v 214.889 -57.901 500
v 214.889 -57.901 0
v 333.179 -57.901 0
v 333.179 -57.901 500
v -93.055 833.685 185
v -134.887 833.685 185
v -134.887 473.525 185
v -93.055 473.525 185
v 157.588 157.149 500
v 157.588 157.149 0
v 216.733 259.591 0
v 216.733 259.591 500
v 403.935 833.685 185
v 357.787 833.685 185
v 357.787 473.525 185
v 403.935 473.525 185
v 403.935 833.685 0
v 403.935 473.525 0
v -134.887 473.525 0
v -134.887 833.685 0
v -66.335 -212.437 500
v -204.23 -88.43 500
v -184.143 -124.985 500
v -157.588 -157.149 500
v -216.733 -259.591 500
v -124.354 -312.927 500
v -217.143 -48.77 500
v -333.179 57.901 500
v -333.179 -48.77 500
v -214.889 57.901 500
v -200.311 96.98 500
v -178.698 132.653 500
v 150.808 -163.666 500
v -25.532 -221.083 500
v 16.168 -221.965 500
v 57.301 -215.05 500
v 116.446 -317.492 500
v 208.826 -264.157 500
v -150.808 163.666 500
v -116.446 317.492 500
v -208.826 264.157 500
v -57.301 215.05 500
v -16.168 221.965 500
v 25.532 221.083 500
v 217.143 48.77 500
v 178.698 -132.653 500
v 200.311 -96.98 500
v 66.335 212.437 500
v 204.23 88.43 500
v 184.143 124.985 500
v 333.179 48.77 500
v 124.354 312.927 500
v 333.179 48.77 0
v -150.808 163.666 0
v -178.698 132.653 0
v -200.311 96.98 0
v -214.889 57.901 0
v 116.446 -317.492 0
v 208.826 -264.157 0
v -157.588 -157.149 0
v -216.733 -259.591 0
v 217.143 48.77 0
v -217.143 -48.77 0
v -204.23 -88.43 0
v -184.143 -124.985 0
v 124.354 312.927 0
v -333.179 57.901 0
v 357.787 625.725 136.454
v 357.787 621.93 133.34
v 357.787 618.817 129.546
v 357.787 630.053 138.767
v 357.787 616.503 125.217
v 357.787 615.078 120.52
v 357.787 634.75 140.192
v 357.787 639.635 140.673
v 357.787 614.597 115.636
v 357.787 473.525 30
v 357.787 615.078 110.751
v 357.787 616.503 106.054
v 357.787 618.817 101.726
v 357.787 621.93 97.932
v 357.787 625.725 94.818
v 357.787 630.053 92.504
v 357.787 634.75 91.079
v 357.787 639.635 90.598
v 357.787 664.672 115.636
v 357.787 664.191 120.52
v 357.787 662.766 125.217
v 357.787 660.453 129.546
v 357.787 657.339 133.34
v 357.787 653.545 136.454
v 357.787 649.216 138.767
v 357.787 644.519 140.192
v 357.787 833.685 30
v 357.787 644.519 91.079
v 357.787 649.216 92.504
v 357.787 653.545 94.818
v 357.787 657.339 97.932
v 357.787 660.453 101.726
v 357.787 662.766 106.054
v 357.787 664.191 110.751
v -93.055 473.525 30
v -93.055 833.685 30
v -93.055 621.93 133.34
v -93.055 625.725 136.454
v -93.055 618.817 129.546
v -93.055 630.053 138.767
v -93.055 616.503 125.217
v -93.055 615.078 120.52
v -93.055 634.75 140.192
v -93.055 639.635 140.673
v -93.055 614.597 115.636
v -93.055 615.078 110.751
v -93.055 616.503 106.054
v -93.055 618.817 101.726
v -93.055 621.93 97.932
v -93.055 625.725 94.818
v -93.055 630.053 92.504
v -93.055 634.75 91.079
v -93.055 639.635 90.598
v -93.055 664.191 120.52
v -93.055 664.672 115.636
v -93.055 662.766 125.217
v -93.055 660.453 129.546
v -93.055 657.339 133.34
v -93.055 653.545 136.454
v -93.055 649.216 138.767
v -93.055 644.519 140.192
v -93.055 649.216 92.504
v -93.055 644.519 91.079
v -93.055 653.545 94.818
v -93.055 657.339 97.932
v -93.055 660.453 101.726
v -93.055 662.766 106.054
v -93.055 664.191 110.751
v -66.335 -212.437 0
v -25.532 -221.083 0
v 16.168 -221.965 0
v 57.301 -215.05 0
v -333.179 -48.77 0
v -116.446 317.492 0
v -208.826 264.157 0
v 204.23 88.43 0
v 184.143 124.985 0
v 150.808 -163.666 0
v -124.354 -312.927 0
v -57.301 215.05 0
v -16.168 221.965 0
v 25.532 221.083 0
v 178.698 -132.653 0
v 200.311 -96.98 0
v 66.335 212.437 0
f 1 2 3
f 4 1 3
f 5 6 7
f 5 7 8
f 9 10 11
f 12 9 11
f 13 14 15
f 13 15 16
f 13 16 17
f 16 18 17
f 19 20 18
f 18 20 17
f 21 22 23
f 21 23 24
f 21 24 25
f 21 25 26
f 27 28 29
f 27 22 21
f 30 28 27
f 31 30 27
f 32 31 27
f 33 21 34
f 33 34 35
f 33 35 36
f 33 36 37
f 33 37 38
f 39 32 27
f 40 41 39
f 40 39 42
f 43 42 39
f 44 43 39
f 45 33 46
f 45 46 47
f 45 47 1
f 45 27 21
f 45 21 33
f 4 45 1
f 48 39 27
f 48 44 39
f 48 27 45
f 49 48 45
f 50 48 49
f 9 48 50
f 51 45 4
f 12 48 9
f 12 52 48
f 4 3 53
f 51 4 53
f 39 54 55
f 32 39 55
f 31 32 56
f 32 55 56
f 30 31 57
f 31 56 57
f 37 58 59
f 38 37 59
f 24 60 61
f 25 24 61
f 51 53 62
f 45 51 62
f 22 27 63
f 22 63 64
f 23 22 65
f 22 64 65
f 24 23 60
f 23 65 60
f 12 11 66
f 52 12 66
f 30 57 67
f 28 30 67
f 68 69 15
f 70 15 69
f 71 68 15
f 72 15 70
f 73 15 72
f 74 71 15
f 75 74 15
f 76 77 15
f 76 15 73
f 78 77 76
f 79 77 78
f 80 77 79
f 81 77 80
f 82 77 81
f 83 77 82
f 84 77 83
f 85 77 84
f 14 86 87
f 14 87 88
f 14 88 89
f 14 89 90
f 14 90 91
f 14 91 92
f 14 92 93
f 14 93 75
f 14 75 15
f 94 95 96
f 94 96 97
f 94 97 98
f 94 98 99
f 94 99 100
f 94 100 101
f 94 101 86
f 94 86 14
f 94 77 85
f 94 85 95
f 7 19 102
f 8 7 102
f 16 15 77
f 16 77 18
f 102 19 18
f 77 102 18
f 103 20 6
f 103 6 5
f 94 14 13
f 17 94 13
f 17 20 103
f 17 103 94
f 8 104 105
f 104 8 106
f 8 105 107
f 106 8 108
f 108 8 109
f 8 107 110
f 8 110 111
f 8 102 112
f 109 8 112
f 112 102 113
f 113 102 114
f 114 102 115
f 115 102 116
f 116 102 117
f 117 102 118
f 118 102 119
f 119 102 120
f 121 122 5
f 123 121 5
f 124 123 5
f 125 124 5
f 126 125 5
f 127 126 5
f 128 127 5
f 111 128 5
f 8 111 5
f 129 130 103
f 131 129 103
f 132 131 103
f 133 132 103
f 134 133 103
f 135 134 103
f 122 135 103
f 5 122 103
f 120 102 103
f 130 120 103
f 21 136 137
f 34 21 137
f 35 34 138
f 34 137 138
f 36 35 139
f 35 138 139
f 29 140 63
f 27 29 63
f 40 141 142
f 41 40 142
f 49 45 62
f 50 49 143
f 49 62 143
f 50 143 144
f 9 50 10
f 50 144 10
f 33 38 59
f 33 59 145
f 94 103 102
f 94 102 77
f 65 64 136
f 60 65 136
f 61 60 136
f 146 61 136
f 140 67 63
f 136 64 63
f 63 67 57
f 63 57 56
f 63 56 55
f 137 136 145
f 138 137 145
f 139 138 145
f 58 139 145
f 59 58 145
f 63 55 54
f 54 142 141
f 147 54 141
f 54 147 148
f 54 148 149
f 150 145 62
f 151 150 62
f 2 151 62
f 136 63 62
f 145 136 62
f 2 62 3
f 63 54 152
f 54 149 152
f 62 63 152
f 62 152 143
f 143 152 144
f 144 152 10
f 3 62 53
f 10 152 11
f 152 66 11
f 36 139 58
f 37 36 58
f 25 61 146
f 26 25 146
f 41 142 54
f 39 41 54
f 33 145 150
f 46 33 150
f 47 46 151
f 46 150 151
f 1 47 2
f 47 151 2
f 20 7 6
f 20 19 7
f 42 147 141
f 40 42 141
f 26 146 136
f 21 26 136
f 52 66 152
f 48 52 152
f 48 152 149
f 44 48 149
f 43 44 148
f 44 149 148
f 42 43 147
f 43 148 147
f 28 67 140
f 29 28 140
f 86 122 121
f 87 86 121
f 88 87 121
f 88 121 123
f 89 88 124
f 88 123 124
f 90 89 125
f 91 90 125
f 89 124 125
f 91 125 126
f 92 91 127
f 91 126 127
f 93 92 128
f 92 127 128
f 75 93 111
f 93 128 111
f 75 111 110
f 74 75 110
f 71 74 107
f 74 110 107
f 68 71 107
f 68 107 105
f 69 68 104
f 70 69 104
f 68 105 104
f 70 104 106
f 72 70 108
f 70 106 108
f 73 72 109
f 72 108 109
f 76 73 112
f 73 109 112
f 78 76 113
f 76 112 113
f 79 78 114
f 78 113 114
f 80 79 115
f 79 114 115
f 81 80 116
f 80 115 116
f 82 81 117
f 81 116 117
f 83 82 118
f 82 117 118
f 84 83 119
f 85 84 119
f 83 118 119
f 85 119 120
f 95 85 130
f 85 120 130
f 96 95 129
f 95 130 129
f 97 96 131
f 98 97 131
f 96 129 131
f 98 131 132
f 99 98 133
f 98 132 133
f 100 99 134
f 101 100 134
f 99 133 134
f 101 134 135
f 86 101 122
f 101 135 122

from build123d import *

# Parameters (mm, degrees)
F1_DEPTH = 500
F2_W     = 538.8212651014
F2_H     = 360.1605892181
F3_DEPTH = 30
F4_W     = 41.8321043253
F4_H     = 360.1605892181
F5_DEPTH = 155
F7_W     = 46.1477041245
F7_H     = 360.1605892181
F8_DEPTH = 155
F6_R     = 25.0375011005
F9_DEPTH = 450.8414566517


with BuildPart() as f1:
    # F0 (on Top) → F1 (new body)
    with BuildSketch(Plane.XY):
        with BuildLine():
            ThreePointArc((214.8888041559, -57.900887914), (220.6284181264, -29.2029465607), (222.5527150425, 0))
            ThreePointArc((222.5527150425, 0), (221.1962112685, 24.5346101098), (217.1432362758, 48.7701334059))
            Line((217.1432362758, 48.7701334059), (182.5777590275, 48.7701334059))
            Line((182.5777590275, 48.7701334059), (182.5777590275, -57.900887914))
            Line((182.5777590275, -57.900887914), (214.8888041559, -57.900887914))
        make_face()
        with BuildLine():
            ThreePointArc((217.1432362758, 48.7701334059), (221.1962112685, 24.5346101098), (222.5527150425, 0))
            ThreePointArc((222.5527150425, 0), (220.6284181264, -29.2029465607), (214.8888041559, -57.900887914))
            Line((214.8888041559, -57.900887914), (333.17938447, -57.900887914))
            Line((333.17938447, -57.900887914), (333.17938447, 48.7701334059))
            Line((333.17938447, 48.7701334059), (217.1432362758, 48.7701334059))
        make_face()
        with BuildLine():
            Line((182.5777590275, 48.7701334059), (217.1432362758, 48.7701334059))
            ThreePointArc((217.1432362758, 48.7701334059), (195.0445133565, 107.1790501091), (157.5880419131, 157.1487194309))
            Line((157.5880419131, 157.1487194309), (141.4325193489, 129.1665335268))
            Line((141.4325193489, 129.1665335268), (49.0527050383, 182.5020441868))
            Line((49.0527050383, 182.5020441868), (66.3354436624, 212.4366255778))
            ThreePointArc((66.3354436624, 212.4366255778), (4.7024765302, 222.5030284901), (-57.3007622427, 215.0496073449))
            Line((-57.3007622427, 215.0496073449), (-41.1452396785, 187.0674214408))
            Line((-41.1452396785, 187.0674214408), (-133.5250539892, 133.7319107809))
            Line((-133.5250539892, 133.7319107809), (-150.8077926134, 163.6664921719))
            ThreePointArc((-150.8077926134, 163.6664921719), (-190.3420368263, 115.3239783809), (-214.8888041559, 57.900887914))
            Line((-214.8888041559, 57.900887914), (-182.5777590275, 57.900887914))
            Line((-182.5777590275, 57.900887914), (-182.5777590275, -48.7701334059))
            Line((-182.5777590275, -48.7701334059), (-217.1432362758, -48.7701334059))
            ThreePointArc((-217.1432362758, -48.7701334059), (-195.0445133565, -107.1790501091), (-157.5880419131, -157.1487194309))
            Line((-157.5880419131, -157.1487194309), (-141.4325193489, -129.1665335268))
            Line((-141.4325193489, -129.1665335268), (-49.0527050383, -182.5020441868))
            Line((-49.0527050383, -182.5020441868), (-66.3354436624, -212.4366255778))
            ThreePointArc((-66.3354436624, -212.4366255778), (-4.7024765302, -222.5030284901), (57.3007622427, -215.0496073449))
            Line((57.3007622427, -215.0496073449), (41.1452396785, -187.0674214408))
            Line((41.1452396785, -187.0674214408), (133.5250539892, -133.7319107809))
            Line((133.5250539892, -133.7319107809), (150.8077926134, -163.6664921719))
            ThreePointArc((150.8077926134, -163.6664921719), (190.3420368263, -115.3239783809), (214.8888041559, -57.900887914))
            Line((214.8888041559, -57.900887914), (182.5777590275, -57.900887914))
            Line((182.5777590275, -57.900887914), (182.5777590275, 48.7701334059))
        make_face()
        with BuildLine():
            Line((141.4325193489, 129.1665335268), (157.5880419131, 157.1487194309))
            ThreePointArc((157.5880419131, 157.1487194309), (115.3239783809, 190.3420368263), (66.3354436624, 212.4366255778))
            Line((66.3354436624, 212.4366255778), (49.0527050383, 182.5020441868))
            Line((49.0527050383, 182.5020441868), (141.4325193489, 129.1665335268))
        make_face()
        with BuildLine():
            ThreePointArc((66.3354436624, 212.4366255778), (115.3239783809, 190.3420368263), (157.5880419131, 157.1487194309))
            Line((157.5880419131, 157.1487194309), (216.7333320702, 259.5913670113))
            Line((216.7333320702, 259.5913670113), (124.3535177595, 312.9268776712))
            Line((124.3535177595, 312.9268776712), (66.3354436624, 212.4366255778))
        make_face()
        with BuildLine():
            Line((208.8258667105, -264.1567442653), (150.8077926134, -163.6664921719))
            ThreePointArc((150.8077926134, -163.6664921719), (107.1790501091, -195.0445133565), (57.3007622427, -215.0496073449))
            Line((57.3007622427, -215.0496073449), (116.4460523998, -317.4922549253))
            Line((116.4460523998, -317.4922549253), (208.8258667105, -264.1567442653))
        make_face()
        with BuildLine():
            ThreePointArc((57.3007622427, -215.0496073449), (107.1790501091, -195.0445133565), (150.8077926134, -163.6664921719))
            Line((150.8077926134, -163.6664921719), (133.5250539892, -133.7319107809))
            Line((133.5250539892, -133.7319107809), (41.1452396785, -187.0674214408))
            Line((41.1452396785, -187.0674214408), (57.3007622427, -215.0496073449))
        make_face()
        with BuildLine():
            Line((-41.1452396785, 187.0674214408), (-57.3007622427, 215.0496073449))
            ThreePointArc((-57.3007622427, 215.0496073449), (-107.1790501091, 195.0445133565), (-150.8077926134, 163.6664921719))
            Line((-150.8077926134, 163.6664921719), (-133.5250539892, 133.7319107809))
            Line((-133.5250539892, 133.7319107809), (-41.1452396785, 187.0674214408))
        make_face()
        with BuildLine():
            ThreePointArc((-150.8077926134, 163.6664921719), (-107.1790501091, 195.0445133565), (-57.3007622427, 215.0496073449))
            Line((-57.3007622427, 215.0496073449), (-116.4460523998, 317.4922549253))
            Line((-116.4460523998, 317.4922549253), (-208.8258667105, 264.1567442653))
            Line((-208.8258667105, 264.1567442653), (-150.8077926134, 163.6664921719))
        make_face()
        with BuildLine():
            Line((-124.3535177595, -312.9268776712), (-66.3354436624, -212.4366255778))
            ThreePointArc((-66.3354436624, -212.4366255778), (-115.3239783809, -190.3420368263), (-157.5880419131, -157.1487194309))
            Line((-157.5880419131, -157.1487194309), (-216.7333320702, -259.5913670113))
            Line((-216.7333320702, -259.5913670113), (-124.3535177595, -312.9268776712))
        make_face()
        with BuildLine():
            ThreePointArc((-157.5880419131, -157.1487194309), (-115.3239783809, -190.3420368263), (-66.3354436624, -212.4366255778))
            Line((-66.3354436624, -212.4366255778), (-49.0527050383, -182.5020441868))
            Line((-49.0527050383, -182.5020441868), (-141.4325193489, -129.1665335268))
            Line((-141.4325193489, -129.1665335268), (-157.5880419131, -157.1487194309))
        make_face()
        with BuildLine():
            Line((-182.5777590275, 57.900887914), (-214.8888041559, 57.900887914))
            ThreePointArc((-214.8888041559, 57.900887914), (-222.5030284901, 4.7024765303), (-217.1432362758, -48.7701334059))
            Line((-217.1432362758, -48.7701334059), (-182.5777590275, -48.7701334059))
            Line((-182.5777590275, -48.7701334059), (-182.5777590275, 57.900887914))
        make_face()
        with BuildLine():
            ThreePointArc((-217.1432362758, -48.7701334059), (-222.5030284901, 4.7024765303), (-214.8888041559, 57.900887914))
            Line((-214.8888041559, 57.900887914), (-333.17938447, 57.900887914))
            Line((-333.17938447, 57.900887914), (-333.17938447, -48.7701334059))
            Line((-333.17938447, -48.7701334059), (-217.1432362758, -48.7701334059))
        make_face()
    extrude(amount=F1_DEPTH)


with BuildPart() as f3:
    # F2 (on Top) → F3 (new body)
    with BuildSketch(Plane.XY):
        with Locations((134.524025023, 653.6050438881)):
            Rectangle(F2_W, F2_H)
    extrude(amount=F3_DEPTH)

    # F4 (on face) → F5 (join)
    with BuildSketch(Plane.XY.offset(30)):
        with Locations((-113.9705553651, 653.6050438881)):
            Rectangle(F4_W, F4_H)
    extrude(amount=F5_DEPTH)

    # F7 (on face) → F8 (join)
    with BuildSketch(Plane.XY.offset(30)):
        with Locations((380.8608055115, 653.6050438881)):
            Rectangle(F7_W, F7_H)
    extrude(amount=F8_DEPTH)

    # F6 (on face) → F9 (join, through all)
    with BuildSketch(Plane.YZ.offset(-93.0545032024)):
        with Locations((639.6346688271, 115.6357377768)):
            Circle(F6_R)
    extrude(amount=F9_DEPTH)


solid = Compound([f1.part, f3.part])
